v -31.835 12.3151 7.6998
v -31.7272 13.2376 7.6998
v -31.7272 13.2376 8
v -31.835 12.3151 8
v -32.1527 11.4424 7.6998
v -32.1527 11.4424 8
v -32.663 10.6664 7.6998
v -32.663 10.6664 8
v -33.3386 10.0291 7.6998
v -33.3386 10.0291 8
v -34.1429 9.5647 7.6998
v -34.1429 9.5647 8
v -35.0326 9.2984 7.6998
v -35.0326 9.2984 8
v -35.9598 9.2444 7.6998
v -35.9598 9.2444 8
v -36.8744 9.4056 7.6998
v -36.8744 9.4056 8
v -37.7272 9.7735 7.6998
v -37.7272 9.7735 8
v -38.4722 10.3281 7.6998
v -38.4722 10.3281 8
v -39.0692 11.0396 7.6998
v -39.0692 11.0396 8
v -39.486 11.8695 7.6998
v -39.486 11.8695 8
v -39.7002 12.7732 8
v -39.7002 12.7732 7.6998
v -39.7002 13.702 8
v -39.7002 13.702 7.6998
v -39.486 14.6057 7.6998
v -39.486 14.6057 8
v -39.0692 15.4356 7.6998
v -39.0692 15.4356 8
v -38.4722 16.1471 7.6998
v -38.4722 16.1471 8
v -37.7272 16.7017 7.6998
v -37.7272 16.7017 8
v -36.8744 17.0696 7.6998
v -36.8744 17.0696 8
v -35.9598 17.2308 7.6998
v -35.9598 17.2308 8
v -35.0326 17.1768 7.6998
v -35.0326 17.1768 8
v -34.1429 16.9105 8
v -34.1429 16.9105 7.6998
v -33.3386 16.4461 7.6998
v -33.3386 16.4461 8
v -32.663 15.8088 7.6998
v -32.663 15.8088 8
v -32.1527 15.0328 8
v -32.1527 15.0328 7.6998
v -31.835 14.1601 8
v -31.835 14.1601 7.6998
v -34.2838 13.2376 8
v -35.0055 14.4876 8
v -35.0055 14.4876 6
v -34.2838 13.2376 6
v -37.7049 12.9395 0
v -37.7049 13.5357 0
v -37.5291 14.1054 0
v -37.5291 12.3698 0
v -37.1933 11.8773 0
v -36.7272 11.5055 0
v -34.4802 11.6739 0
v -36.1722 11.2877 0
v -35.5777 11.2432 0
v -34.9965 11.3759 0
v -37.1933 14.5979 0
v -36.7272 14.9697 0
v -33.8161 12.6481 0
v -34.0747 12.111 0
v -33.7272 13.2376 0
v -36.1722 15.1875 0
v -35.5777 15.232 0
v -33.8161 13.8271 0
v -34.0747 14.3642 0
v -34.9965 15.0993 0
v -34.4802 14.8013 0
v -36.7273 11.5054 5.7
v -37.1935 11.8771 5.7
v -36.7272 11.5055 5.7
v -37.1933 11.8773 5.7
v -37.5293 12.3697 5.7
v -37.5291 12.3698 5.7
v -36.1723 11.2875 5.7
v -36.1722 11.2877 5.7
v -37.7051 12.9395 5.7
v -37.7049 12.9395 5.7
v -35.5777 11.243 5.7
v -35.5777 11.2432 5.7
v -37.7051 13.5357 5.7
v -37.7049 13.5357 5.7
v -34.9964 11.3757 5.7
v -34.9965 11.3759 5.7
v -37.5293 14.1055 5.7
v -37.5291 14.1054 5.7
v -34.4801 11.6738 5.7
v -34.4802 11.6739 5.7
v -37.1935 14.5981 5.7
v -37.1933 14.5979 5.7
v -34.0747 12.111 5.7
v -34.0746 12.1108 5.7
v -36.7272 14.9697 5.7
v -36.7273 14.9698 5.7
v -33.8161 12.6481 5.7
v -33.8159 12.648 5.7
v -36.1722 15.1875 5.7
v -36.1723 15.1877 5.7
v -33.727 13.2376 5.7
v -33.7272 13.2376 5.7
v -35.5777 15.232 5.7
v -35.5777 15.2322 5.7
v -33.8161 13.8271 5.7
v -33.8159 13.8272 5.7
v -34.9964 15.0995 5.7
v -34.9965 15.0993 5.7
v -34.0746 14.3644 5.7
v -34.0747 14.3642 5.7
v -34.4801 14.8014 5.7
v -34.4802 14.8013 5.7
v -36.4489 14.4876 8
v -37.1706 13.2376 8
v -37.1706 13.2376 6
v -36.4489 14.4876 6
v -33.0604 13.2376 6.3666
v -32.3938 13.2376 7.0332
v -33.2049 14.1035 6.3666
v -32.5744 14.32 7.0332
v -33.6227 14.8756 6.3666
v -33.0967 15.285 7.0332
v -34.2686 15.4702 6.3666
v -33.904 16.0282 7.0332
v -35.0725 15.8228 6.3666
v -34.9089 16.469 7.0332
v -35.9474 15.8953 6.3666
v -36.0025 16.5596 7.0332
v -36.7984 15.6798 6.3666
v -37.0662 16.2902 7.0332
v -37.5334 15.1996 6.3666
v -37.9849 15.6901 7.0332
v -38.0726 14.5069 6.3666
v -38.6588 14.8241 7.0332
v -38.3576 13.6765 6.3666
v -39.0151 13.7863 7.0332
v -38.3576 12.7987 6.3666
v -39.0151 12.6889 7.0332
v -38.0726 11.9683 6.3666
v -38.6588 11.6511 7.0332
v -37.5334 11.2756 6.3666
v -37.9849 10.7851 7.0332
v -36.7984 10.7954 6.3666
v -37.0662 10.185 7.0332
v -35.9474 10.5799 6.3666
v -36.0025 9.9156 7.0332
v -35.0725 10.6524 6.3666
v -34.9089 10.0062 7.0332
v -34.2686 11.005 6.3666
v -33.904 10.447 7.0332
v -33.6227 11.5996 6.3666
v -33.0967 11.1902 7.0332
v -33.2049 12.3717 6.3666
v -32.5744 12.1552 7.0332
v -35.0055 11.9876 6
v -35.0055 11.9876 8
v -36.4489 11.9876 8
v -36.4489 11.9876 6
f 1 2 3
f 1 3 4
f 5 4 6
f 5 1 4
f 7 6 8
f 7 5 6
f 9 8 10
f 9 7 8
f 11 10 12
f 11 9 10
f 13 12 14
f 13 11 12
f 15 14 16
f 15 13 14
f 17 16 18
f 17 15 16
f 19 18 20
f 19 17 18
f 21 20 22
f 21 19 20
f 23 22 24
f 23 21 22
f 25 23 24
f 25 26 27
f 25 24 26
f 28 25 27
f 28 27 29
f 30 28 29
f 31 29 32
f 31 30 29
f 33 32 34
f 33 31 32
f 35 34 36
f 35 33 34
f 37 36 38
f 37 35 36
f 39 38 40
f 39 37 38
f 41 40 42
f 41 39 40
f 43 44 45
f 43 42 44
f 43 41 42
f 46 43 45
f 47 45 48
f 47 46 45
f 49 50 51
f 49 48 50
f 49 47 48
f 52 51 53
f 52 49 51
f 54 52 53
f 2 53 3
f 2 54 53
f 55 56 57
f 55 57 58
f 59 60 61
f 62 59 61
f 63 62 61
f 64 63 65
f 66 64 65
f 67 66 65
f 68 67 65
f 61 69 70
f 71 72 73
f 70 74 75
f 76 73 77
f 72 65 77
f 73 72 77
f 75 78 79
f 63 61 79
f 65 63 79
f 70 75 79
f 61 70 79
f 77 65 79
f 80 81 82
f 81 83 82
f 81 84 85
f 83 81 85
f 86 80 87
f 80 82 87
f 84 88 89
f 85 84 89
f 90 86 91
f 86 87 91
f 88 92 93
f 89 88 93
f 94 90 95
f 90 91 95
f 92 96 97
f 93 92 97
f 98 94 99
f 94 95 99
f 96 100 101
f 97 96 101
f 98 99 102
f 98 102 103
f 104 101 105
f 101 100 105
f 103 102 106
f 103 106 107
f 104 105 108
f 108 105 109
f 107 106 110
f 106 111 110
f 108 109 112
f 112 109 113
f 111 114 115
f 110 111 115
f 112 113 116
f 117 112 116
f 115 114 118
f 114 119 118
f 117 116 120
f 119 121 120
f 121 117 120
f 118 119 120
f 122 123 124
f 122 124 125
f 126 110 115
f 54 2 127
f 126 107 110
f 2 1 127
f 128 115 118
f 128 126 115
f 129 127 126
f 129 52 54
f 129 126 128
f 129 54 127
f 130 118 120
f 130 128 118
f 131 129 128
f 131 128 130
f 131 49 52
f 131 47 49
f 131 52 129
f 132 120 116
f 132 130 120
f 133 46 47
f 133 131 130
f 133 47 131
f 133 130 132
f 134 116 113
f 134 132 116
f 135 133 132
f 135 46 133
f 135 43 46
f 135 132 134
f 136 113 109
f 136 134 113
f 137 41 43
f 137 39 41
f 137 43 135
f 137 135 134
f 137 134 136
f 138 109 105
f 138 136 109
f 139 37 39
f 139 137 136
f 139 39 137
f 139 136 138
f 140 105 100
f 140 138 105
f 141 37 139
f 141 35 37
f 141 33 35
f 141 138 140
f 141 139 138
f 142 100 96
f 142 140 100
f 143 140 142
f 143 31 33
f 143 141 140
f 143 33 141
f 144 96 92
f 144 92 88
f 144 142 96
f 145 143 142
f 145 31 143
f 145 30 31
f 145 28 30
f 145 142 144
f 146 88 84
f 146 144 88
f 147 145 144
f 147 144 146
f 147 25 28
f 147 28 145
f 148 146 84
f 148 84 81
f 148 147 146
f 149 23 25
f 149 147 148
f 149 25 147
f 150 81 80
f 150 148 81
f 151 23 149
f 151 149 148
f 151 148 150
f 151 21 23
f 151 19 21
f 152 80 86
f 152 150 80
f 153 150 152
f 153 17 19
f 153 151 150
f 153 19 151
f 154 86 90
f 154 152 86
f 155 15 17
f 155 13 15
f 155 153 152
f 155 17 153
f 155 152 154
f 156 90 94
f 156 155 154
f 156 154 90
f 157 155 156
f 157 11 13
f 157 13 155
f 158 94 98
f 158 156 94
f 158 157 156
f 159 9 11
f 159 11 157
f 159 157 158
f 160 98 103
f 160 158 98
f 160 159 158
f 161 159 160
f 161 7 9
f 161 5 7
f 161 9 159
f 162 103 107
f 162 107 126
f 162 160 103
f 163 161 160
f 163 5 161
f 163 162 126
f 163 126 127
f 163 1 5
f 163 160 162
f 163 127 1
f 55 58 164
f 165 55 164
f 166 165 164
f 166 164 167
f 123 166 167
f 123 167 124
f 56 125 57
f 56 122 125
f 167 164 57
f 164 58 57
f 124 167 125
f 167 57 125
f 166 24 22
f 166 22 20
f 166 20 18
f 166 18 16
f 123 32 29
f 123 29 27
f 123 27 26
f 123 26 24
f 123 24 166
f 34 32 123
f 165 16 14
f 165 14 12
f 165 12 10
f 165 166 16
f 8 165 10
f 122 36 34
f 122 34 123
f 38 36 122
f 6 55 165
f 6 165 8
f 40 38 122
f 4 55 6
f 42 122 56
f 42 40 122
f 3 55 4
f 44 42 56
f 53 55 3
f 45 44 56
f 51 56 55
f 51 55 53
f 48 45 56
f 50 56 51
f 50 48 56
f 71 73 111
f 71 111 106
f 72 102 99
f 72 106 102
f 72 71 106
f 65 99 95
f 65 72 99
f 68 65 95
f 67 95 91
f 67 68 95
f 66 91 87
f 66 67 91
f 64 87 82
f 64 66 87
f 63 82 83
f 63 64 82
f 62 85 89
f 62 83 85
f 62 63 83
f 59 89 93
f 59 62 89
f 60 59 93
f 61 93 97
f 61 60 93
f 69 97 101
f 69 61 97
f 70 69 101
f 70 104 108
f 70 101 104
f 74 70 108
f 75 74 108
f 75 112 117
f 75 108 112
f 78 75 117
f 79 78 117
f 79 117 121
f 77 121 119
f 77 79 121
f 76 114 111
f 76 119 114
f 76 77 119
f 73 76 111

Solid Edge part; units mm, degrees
sketch "Sketch1" plane through (0, 0, 0) normal (0, 0, 1) x (1, 0, 0)
  circle A0 centre (-35.7272, 13.2376) radius 2
  dimension "D1" = 4
extrude "Protrusion1" add sketch "Sketch1" along normal blind 5.7
sketch "Sketch2" plane through (-35.7272, 13.2376, 5.7) normal (0, 0, 1) x (1, 0, 0)
  circle A0 centre (0, 0) radius 4
  dimension "D1" = 8
extrude "kopdia8" add sketch "Sketch2" along normal blind 2.3
chamfer "kegel" distance 2 angle 45 1 edges at (-39.7272, 13.2376, 5.7)
cosmetic_thread "Thread1" size "M4"
sketch "Sketch3" plane through (-35.7272, 13.2376, 8) normal (0, 0, 1) x (1, 0, 0)
  line L0 (-0.7217, 1.25) -> (0.7217, 1.25)
  line L1 (0.7217, 1.25) -> (1.4434, 0)
  line L2 (1.4434, 0) -> (0.7217, -1.25)
  line L3 (0.7217, -1.25) -> (-0.7217, -1.25)
  line L4 (-0.7217, -1.25) -> (-1.4434, 0)
  line L5 (-1.4434, 0) -> (-0.7217, 1.25)
  dimension "D1" = 2.5
extrude "zeskant" cut sketch "Sketch3" against normal blind 2
